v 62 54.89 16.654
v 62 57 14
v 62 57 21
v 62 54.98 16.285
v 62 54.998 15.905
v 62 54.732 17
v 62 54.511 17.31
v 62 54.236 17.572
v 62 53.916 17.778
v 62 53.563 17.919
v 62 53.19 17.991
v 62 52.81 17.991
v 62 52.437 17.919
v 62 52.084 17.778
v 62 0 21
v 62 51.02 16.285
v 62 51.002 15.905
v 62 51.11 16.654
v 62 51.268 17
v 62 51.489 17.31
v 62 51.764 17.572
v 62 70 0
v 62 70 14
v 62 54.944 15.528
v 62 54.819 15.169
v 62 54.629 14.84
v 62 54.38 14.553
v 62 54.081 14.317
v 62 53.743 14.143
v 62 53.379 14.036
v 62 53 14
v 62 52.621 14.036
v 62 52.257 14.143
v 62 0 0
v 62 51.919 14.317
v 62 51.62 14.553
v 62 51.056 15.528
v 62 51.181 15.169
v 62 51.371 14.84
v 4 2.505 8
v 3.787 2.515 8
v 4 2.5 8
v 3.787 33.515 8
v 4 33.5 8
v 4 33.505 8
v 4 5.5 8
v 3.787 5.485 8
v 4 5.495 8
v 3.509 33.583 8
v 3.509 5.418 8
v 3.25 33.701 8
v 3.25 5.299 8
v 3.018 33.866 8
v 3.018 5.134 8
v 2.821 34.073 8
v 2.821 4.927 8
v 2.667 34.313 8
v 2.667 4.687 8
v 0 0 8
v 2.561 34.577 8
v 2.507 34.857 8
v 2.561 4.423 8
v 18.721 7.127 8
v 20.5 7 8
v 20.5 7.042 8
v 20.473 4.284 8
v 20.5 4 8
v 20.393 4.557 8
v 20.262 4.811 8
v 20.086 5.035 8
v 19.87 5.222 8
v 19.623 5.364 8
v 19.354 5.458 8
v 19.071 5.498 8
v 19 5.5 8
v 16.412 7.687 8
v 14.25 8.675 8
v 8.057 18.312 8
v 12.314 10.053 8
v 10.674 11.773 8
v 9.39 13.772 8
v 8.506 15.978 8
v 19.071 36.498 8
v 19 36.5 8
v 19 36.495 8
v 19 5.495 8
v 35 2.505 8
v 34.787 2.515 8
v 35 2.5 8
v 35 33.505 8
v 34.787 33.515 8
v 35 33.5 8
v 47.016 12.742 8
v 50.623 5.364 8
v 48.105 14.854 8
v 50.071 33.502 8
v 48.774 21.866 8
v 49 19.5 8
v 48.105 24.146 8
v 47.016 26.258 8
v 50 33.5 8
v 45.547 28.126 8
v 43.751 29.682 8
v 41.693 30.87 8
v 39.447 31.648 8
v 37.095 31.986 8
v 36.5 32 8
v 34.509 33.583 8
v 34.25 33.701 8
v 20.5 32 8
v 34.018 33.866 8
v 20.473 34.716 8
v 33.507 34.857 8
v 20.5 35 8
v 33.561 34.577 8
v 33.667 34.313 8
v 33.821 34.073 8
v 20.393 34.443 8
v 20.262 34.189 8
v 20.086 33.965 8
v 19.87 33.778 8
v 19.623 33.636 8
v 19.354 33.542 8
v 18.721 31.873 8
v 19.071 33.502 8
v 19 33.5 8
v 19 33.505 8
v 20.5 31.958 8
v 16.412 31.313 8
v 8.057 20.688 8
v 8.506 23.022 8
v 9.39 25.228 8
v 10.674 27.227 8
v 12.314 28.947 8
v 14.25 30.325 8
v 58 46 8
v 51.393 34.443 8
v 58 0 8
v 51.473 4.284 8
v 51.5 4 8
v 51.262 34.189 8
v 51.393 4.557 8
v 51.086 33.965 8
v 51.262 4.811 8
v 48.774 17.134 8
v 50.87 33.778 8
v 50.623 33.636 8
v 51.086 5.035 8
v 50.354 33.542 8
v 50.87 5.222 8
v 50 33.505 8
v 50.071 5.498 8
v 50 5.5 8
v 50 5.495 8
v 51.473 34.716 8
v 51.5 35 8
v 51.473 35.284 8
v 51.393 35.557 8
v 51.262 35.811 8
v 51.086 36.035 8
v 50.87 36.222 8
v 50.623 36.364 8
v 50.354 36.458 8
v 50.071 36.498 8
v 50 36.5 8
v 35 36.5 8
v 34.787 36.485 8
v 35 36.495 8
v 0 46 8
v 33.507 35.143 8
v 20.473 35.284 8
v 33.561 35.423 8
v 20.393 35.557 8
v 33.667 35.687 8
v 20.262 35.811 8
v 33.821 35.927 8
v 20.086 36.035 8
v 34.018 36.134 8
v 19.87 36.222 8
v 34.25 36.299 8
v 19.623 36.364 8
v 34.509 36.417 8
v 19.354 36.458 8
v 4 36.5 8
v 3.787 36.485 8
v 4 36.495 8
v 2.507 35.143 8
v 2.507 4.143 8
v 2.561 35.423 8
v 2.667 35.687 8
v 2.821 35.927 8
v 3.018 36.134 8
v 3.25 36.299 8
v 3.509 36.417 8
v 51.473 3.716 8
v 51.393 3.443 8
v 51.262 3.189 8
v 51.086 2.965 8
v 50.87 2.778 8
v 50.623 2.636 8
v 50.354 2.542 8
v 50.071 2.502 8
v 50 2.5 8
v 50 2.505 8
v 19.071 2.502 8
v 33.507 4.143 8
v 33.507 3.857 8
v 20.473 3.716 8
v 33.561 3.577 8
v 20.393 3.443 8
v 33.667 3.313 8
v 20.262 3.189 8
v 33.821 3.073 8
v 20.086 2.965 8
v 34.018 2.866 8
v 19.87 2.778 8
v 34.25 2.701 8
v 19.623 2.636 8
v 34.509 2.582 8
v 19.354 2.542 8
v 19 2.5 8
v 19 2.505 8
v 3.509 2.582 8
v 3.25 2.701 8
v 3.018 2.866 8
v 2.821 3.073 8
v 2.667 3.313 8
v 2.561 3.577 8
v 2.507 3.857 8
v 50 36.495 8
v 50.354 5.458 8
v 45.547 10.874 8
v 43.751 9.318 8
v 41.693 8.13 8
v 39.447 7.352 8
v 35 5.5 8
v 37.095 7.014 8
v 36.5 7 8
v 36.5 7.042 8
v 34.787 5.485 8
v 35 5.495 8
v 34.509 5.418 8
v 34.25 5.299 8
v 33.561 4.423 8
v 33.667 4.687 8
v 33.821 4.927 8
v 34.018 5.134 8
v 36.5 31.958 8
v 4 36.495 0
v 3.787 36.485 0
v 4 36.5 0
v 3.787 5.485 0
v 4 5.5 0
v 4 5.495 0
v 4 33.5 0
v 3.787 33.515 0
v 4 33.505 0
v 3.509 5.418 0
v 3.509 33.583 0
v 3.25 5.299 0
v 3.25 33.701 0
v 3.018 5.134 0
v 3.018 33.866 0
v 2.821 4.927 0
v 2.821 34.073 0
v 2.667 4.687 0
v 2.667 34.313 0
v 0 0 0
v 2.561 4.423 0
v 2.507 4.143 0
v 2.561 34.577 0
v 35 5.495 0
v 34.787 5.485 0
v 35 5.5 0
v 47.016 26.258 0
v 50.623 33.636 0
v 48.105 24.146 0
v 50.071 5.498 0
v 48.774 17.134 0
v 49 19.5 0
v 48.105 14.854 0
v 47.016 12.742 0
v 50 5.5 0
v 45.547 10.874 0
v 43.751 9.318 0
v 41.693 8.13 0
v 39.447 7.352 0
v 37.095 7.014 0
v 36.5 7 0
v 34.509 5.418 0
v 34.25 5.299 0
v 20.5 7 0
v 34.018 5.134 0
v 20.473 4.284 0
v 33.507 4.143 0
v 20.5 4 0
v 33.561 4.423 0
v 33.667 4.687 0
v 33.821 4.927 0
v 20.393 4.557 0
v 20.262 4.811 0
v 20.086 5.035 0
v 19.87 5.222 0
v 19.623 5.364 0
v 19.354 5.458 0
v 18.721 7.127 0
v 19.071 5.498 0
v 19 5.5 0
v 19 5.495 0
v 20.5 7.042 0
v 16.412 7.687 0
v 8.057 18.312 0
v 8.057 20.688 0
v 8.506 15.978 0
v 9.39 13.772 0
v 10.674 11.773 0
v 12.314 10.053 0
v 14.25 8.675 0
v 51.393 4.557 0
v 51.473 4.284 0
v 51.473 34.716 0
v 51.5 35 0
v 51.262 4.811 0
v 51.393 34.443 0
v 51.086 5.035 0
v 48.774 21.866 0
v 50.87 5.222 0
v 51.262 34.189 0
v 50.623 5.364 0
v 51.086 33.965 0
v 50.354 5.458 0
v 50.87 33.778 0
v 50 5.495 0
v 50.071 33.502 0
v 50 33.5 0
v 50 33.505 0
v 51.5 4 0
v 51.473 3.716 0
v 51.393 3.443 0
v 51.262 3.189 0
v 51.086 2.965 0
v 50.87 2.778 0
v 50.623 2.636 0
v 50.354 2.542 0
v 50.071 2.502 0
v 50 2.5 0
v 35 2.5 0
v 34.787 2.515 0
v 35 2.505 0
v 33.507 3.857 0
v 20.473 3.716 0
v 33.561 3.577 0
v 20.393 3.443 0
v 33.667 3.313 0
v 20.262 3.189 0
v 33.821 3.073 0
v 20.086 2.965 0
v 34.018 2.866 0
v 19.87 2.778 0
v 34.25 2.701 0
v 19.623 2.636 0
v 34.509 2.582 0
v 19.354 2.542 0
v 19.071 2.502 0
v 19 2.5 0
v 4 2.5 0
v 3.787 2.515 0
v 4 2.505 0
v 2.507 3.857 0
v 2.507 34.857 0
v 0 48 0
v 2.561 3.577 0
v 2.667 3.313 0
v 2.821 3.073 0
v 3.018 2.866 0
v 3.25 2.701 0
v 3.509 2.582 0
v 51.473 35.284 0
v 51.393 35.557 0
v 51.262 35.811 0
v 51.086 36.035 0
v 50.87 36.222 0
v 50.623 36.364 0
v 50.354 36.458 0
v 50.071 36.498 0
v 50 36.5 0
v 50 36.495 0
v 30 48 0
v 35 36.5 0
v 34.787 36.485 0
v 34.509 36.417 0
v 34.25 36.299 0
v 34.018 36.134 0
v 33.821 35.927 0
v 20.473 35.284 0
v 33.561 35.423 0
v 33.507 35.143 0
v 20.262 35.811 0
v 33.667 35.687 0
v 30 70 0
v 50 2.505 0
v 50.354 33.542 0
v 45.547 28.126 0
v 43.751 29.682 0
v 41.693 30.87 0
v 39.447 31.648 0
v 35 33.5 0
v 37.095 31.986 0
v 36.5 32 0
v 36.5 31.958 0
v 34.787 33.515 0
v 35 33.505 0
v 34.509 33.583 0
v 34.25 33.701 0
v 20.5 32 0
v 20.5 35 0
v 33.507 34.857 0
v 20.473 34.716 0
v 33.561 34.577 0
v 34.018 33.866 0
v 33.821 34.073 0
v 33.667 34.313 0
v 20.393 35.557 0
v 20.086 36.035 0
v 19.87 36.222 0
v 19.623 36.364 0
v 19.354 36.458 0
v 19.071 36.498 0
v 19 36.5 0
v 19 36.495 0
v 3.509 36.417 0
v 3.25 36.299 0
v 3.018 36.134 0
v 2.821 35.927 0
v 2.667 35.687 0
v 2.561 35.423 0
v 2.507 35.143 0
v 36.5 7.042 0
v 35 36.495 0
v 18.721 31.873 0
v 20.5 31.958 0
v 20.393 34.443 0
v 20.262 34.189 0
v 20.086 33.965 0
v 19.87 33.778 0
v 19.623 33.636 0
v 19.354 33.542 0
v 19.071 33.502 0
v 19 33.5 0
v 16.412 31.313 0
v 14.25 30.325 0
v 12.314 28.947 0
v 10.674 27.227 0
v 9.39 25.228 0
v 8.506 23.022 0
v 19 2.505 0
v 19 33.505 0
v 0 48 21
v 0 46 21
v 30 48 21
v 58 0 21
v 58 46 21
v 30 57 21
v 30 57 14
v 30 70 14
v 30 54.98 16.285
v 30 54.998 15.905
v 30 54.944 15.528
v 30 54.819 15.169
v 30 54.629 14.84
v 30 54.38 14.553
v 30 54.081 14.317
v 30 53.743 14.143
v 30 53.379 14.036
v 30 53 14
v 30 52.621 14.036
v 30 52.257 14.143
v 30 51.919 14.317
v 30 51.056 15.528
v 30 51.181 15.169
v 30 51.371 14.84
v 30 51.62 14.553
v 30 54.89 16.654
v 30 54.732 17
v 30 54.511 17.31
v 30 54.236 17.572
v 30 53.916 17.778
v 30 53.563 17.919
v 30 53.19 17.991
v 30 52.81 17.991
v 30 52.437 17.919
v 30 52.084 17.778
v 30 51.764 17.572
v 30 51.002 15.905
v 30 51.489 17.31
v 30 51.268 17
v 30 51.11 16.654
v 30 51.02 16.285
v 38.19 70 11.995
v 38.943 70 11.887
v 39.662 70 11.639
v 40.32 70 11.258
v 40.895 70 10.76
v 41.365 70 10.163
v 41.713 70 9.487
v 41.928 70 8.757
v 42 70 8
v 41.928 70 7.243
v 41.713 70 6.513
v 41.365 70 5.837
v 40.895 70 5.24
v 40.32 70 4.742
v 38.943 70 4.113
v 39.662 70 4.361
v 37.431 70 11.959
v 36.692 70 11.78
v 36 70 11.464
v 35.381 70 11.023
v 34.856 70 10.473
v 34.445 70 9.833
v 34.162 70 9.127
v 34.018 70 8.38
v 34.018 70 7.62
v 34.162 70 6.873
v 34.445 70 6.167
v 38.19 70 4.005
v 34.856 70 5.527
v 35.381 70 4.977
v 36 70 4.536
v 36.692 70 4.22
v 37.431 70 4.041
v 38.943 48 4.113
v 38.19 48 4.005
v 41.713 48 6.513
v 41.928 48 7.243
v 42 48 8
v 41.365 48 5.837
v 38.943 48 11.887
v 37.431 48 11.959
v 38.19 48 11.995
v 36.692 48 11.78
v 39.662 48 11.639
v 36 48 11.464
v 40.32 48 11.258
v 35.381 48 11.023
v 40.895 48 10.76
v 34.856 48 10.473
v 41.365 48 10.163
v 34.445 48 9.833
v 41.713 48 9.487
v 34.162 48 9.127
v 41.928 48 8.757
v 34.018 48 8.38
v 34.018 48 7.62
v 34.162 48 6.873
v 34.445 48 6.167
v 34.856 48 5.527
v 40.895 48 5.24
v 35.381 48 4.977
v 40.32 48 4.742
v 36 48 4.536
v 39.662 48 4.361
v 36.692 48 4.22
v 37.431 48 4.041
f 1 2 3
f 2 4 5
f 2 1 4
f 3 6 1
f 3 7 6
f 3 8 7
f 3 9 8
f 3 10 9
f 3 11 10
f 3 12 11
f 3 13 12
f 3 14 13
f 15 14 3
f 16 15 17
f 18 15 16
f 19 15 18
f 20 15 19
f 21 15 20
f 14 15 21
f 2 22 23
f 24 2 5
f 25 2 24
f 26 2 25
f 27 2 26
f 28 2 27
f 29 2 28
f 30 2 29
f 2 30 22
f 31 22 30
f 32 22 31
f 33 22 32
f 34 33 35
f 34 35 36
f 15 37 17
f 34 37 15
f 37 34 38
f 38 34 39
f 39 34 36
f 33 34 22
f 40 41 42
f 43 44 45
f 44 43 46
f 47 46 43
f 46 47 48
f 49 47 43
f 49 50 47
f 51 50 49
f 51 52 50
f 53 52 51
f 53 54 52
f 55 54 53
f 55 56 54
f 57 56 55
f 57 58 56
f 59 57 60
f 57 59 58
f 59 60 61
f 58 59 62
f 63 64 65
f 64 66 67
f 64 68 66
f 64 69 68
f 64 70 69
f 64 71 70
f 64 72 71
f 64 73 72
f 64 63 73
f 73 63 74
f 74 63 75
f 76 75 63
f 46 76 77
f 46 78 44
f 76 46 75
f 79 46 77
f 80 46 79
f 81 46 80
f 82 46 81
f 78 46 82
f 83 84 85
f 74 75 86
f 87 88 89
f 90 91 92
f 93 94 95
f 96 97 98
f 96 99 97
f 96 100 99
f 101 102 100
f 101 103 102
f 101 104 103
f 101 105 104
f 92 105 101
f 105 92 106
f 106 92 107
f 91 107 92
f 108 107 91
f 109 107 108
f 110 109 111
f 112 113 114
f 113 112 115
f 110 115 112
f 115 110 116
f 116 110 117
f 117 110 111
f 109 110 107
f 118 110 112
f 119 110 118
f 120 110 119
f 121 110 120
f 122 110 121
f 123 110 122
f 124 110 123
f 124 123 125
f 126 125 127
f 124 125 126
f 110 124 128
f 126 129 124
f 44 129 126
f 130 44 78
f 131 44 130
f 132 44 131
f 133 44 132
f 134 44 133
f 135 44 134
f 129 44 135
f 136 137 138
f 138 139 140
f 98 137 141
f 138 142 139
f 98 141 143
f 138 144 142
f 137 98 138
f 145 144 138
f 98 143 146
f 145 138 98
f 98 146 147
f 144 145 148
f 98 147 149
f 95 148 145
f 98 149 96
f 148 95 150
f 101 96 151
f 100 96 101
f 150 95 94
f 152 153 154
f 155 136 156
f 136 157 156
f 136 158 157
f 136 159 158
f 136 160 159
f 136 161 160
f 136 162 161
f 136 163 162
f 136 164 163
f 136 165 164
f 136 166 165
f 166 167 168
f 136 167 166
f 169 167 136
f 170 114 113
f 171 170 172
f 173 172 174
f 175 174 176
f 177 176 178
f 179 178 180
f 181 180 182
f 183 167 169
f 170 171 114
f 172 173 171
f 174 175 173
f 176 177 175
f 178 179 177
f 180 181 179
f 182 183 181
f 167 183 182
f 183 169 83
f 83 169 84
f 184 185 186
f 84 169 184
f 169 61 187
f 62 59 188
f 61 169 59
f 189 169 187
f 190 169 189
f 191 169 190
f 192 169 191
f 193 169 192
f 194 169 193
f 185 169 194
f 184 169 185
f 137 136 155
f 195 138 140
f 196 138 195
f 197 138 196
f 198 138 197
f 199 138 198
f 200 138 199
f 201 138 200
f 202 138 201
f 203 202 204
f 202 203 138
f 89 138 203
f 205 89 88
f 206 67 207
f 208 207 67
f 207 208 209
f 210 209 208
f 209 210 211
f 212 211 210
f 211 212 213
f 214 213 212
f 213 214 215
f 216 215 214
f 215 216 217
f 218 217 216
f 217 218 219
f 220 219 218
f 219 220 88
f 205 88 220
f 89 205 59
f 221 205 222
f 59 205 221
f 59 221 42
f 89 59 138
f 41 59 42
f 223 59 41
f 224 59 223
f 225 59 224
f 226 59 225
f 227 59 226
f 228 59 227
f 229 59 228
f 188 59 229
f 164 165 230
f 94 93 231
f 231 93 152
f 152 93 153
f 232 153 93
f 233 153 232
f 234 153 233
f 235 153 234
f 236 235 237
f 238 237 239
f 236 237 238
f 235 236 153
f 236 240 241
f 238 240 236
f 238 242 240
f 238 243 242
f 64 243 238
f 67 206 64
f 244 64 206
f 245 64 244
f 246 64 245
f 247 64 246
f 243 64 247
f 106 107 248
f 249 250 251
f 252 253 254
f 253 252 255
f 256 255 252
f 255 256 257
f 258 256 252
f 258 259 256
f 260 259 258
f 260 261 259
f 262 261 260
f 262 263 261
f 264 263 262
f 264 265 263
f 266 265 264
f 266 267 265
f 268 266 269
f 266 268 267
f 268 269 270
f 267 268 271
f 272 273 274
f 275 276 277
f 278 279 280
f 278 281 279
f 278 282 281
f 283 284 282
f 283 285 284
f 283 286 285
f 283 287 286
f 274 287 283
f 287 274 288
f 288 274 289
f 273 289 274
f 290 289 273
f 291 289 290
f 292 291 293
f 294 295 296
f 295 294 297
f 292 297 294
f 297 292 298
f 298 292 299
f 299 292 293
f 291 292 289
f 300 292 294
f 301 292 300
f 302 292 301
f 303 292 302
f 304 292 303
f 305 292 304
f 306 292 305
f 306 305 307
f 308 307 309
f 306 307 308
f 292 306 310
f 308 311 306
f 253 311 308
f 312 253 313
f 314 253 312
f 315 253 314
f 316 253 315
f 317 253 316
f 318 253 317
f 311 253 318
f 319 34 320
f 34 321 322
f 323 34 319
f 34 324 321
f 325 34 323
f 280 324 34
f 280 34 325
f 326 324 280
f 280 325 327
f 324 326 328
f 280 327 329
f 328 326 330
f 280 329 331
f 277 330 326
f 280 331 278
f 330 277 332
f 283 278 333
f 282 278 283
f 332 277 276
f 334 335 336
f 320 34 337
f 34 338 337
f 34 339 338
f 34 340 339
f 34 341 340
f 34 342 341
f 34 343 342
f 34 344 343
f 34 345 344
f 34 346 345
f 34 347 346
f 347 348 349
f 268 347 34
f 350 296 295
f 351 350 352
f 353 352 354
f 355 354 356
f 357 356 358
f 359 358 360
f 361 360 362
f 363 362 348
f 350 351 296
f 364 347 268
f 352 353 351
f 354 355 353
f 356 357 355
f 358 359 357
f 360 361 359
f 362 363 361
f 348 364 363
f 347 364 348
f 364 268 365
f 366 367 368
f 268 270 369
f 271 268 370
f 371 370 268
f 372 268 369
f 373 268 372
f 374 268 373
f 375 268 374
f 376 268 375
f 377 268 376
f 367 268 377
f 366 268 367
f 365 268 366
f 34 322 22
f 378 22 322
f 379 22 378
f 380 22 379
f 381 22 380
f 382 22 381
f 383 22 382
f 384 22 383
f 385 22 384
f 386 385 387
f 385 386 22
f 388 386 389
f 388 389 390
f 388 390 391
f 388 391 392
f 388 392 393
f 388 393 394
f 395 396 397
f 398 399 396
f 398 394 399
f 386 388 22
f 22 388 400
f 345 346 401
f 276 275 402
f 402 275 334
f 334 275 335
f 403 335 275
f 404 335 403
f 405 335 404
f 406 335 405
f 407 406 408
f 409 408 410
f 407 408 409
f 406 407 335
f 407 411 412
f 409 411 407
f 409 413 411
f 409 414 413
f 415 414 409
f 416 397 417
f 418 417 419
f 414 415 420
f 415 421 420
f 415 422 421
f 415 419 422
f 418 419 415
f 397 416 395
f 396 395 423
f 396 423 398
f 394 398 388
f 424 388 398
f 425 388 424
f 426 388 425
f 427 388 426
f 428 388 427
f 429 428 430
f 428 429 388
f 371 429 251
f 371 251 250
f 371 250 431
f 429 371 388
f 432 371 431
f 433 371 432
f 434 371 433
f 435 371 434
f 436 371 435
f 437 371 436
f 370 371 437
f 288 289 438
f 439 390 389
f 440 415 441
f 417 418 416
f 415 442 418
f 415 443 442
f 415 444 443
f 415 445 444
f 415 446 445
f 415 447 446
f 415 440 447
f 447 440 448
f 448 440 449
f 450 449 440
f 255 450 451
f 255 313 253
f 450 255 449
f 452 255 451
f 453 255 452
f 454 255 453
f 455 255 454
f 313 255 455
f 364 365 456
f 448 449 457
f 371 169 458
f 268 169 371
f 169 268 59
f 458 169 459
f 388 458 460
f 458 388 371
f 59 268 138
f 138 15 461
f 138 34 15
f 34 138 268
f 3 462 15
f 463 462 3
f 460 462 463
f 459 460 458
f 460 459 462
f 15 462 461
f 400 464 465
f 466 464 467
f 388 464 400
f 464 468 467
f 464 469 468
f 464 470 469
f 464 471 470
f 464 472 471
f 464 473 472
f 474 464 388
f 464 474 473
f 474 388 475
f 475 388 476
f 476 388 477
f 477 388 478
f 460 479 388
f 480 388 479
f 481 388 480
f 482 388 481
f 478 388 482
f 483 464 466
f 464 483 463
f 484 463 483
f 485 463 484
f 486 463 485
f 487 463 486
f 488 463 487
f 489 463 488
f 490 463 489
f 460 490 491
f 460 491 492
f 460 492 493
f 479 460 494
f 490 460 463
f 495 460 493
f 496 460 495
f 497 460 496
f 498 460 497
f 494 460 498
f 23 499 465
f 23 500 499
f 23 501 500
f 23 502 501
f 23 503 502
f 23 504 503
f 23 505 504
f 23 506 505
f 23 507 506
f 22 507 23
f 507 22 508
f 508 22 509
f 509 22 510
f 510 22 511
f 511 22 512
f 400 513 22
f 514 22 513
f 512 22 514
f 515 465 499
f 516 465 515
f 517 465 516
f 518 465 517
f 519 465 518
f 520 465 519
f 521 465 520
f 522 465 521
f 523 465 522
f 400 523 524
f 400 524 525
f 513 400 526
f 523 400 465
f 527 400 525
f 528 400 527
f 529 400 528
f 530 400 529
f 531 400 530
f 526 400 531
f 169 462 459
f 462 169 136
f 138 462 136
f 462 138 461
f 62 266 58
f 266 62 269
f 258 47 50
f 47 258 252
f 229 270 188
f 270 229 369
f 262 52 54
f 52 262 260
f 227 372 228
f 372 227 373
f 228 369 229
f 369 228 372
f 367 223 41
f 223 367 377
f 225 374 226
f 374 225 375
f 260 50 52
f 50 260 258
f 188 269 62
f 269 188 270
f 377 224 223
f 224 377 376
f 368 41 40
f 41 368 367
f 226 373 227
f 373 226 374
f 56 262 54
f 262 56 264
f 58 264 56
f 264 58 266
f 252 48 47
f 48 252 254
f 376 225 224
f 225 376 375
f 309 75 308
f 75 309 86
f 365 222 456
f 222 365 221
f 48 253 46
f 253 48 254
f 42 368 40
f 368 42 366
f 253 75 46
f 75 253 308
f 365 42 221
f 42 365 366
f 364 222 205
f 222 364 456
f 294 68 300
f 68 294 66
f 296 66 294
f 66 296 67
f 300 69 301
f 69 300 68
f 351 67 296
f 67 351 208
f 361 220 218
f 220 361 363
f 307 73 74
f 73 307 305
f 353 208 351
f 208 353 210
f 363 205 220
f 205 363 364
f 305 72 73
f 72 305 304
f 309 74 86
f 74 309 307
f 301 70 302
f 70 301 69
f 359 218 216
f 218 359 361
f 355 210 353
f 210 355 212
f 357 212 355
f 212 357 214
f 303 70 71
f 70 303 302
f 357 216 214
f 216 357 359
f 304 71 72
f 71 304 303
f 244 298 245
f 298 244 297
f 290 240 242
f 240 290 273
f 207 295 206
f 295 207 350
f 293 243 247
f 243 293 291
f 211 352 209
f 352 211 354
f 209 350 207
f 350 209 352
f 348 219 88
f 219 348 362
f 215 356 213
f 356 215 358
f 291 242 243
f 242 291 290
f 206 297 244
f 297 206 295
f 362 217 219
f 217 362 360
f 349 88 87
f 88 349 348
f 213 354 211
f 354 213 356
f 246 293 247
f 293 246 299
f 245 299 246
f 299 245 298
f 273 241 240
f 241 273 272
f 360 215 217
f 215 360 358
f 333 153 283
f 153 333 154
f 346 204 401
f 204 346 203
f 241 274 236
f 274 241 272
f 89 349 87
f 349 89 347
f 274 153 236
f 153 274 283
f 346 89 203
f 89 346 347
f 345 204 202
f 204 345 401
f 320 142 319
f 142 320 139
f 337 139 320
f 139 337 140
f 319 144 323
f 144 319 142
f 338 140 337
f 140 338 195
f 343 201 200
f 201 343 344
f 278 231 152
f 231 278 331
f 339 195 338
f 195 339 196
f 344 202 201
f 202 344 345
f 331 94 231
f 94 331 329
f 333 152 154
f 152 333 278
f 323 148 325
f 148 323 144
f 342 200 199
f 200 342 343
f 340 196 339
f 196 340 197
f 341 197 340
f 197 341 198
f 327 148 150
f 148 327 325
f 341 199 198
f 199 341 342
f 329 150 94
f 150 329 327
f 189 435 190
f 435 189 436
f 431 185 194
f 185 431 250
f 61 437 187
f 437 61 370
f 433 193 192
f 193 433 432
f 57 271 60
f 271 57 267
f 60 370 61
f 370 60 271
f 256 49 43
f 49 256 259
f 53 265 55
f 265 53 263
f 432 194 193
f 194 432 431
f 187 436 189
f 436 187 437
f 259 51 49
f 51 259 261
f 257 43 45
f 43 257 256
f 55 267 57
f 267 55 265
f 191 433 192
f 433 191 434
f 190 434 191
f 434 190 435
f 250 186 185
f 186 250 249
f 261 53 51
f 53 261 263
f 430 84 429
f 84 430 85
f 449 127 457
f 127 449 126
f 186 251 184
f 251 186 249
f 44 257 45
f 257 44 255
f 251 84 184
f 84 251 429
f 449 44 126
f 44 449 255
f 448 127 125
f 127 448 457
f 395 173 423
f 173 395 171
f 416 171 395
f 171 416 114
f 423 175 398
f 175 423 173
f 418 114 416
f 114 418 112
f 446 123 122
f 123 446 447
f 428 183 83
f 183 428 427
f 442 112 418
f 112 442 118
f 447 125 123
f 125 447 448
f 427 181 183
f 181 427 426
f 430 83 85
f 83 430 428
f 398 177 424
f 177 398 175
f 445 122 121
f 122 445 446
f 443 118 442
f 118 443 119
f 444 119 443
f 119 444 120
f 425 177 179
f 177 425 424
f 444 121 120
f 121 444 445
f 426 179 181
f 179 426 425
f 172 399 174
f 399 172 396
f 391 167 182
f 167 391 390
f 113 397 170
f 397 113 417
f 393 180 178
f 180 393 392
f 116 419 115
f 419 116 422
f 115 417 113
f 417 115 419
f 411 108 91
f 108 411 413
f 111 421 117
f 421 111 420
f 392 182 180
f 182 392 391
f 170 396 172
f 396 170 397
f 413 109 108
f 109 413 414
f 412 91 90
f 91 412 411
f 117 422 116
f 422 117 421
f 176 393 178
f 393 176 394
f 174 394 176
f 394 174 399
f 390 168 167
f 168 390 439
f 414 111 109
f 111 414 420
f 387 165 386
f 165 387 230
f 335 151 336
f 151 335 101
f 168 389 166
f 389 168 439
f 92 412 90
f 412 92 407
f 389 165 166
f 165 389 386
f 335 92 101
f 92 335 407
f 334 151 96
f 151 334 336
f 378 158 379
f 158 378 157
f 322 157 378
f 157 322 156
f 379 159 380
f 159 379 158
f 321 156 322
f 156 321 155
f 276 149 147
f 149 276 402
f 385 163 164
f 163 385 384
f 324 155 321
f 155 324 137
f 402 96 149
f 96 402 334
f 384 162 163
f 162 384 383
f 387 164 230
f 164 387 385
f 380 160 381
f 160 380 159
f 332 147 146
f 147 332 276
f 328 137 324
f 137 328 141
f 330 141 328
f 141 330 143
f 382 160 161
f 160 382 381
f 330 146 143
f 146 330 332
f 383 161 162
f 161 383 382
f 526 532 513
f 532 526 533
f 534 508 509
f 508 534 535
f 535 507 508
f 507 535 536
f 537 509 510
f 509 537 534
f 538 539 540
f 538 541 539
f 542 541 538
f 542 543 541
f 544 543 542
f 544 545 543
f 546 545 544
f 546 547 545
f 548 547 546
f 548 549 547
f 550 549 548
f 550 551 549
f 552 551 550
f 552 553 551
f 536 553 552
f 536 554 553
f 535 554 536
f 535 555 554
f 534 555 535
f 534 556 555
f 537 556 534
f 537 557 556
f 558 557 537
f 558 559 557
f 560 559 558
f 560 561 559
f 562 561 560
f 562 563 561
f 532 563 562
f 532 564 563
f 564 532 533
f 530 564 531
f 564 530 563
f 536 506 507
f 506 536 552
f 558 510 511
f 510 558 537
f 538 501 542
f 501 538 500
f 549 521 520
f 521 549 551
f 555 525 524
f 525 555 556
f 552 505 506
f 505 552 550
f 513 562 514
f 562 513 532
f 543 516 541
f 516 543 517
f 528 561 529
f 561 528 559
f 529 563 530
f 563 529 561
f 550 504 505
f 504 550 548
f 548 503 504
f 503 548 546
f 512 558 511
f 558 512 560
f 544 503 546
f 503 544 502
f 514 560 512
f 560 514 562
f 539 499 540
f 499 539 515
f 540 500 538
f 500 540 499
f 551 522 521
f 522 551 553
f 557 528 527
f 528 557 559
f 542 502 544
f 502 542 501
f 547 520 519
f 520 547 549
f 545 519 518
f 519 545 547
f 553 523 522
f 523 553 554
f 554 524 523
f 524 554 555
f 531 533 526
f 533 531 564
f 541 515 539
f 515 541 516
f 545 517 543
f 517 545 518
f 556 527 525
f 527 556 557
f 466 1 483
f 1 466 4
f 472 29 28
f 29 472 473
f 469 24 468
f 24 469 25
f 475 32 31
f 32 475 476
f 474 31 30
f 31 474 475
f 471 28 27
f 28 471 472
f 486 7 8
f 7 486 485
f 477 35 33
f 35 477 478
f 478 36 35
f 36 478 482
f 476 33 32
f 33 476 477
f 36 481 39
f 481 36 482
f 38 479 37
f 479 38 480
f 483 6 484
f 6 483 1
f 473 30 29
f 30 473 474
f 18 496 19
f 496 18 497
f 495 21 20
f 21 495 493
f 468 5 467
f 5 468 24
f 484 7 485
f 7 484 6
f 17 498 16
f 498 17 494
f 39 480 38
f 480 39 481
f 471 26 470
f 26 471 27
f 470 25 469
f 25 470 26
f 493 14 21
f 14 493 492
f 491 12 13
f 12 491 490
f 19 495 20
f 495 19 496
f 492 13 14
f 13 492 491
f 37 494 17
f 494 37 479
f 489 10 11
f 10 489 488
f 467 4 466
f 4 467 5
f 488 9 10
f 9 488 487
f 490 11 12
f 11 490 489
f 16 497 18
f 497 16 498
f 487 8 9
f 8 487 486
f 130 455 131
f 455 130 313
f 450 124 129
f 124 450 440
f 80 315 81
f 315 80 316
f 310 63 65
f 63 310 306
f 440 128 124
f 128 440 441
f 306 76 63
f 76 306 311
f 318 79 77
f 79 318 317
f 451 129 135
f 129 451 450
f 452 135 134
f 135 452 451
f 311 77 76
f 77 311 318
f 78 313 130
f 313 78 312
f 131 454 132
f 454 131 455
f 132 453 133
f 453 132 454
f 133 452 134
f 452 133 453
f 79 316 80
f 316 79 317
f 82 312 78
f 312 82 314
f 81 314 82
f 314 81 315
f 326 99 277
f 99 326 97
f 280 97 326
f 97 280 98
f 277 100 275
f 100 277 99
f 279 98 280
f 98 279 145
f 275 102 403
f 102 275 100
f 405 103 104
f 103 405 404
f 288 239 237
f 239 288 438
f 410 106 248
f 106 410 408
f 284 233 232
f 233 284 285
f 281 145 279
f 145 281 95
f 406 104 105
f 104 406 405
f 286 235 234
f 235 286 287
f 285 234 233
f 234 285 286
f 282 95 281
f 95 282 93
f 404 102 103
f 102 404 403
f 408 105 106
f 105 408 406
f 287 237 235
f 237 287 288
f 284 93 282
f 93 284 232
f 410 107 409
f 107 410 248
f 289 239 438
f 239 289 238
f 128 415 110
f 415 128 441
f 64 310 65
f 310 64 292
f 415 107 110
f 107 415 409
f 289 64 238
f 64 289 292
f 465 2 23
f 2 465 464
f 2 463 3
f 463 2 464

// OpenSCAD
// file: configuration.scad
// Copyright (C) 2012 t00tie
// Adapto is licensed under the Creative Commons - GNU GPL license.
// http://creativecommons.org/licenses/GPL/2.0/

// Configuration file for Adapto OpenSCAD files

// frame and walls
// frameX and frameY are the dimensions of the frame parts like extrusions
// frameX is the width of the Y frame seen from the front (an extrusion looks roughly like an X)
// frameY is the height of the Y frame seen from the front
// these are used to find offsets for screw placing so screws meet the (slot in the) middle of the frame
frameX=20;// width of frame parts (alu, wood etc.)
frameY=20;// ditto
thickness=6;// thickness of walls etc. in parts

// Screws and bolts and rods
boltOuterRadius=5/2;// outer radius of bolt threads, 5 for M5 bolts
boltLength=60;//bolt length without head (threaded part only)
washerOuterRadius=10/2;// washers that fit the bolts
washerLength=10;// this is large because it is used to make holes for washers
boltOffset=frameX/2;// How far in the bolt holes go, may need tweaking if framX!=frameY

xRodDistance=70;// i3 xaxis_rod_distance=45, try this for compatible extruders, ymmv
screwR=5.3/2;// Defaults for M5 screws
// print the hole_calibration.scad object to dial in the next 6 settings
// google found http://www.fairburyfastener.com/xdims_metric_nuts.htm
M8=8.4;// diameter of M8 threaded rod
M5=5.3;// diameter of M5 threaded rod
M3=3.4;// diameter of M3 threaded rod
M8nut=15.2;// diameter of M8 nut using $fn=6
M5nut=9.9;// diameter of M5 nut using $fn=6
M3nut=6.9;// diameter of M3 nut using $fn=6
M8nutThickness=6.8;// thickness of a standard M8 nut
M5nutThickness=4.7;// thickness of a standard M5 nut
M3nutThickness=2.4;// thickness of a standard M3 nut
smoothRod=M8;// diameter of smooth rods


// bearings
// lm8uu is IDxODxL 8x15x24mm, lm10uu is 10x19x29mm
lm8uu=[8, 15, 24];
lm10uu=[10, 19, 29];
linearBearing=lm8uu;// change this to the one you want from the list above
// 608zz 608rs


// Copied from 
// PRUSA Mendel  
// Default metric sizes
// GNU GPL v3
// Josef Průša
// josefprusa@me.com
// prusadjs.cz
// http://www.reprap.org/wiki/Prusa_Mendel
// http://github.com/prusajr/PrusaMendel
m3_nut_diameter = 5.3;
m3_nut_diameter_bigger = ((m3_nut_diameter  / 2) / cos (180 / 6))*2;// =6.119912853410033 this is silly
// file: bolt.scad
include <configuration.scad>;

module bolt(){
	union(){
		translate([0, 0, -boltLength]) cylinder(r=boltOuterRadius, h=boltLength+1);
		cylinder(r=washerOuterRadius, h=washerLength);
	}
}

// a bolt and washer intended for making equivalent holes
// the parameter from indicates which side the bolt is inserted from
module boltWasher(from="x-"){
	if(from=="x+"){
		rotate([0, 90, 0]) bolt();
	} else
	if(from=="x-"){
		rotate([0, -90, 0]) bolt();
	} else
	if(from=="y+"){
		rotate([-90, 0, 0]) bolt();
	} else
	if(from=="y-"){
		rotate([90, 0, 0]) bolt();
	} else
	if(from=="z+"){
		rotate([0, 0, 0]) bolt();
	} else
	if(from=="z-"){
		rotate([180, 0, 0]) bolt();
	}
}

boltWasher("x-");
// main file
// Copyright (C) 2012 t00tie
// After an stl designed by RoTorIT
// Adapto is licensed under the Creative Commons - GNU GPL license.
// http://creativecommons.org/licenses/GPL/2.0/


use <bolt.scad>;
include <configuration.scad>;

$fn=33;
m8rodr=8/2;
m4rodr=4/2;
m3rodr=3/2;
motorcc=31;// centre-centre of the motor screw holes for nema17
centerr=25/2;// radius of the centre holes

difference(){
	union(){
		cube([62, 48, 8]);
		translate([30, 48, 0]) cube([32, 22, 21]);
		translate([0, 48-2, 0]) cube([62, 2, 21]);
		translate([58, 0, 0]) cube([4, 48, 21]);
	}
	translate([34+m8rodr, 48, 4+m8rodr]) rotate([-90,0,0]) cylinder(r=m8rodr, h=24+1);
	translate([30-1, 51+m4rodr, 14+m4rodr]) rotate([0,90,0]) cylinder(r=m4rodr, h=32+1+1);
	translate([8+centerr, 4+2*m3rodr+centerr, -1]) cylinder(r=centerr, h=8+2);
	translate([8+centerr+motorcc-(18-2*m3rodr), 4+2*m3rodr+centerr, -1]) cylinder(r=centerr, h=8+2);
	translate([8+centerr, 4+2*m3rodr, -1]) cube([motorcc-(18-2*m3rodr), 2*centerr, 8+2]);
	translate([4, 4, -1]) oval();
	translate([4+motorcc, 4, -1]) oval();
	translate([4, 4+motorcc, -1]) oval();
	translate([4+motorcc, 4+motorcc, -1]) oval();
	translate([0, 57, 14]) cube([111, 111, 111]);
}

module oval(){
	cylinder(r=m3rodr, h=8+2);
	translate([0, -m3rodr, 0]) cube([18-2*m3rodr, 2*m3rodr, 8+2]);
	translate([18-2*m3rodr, 0, 0]) cylinder(r=m3rodr, h=8+2);
}
